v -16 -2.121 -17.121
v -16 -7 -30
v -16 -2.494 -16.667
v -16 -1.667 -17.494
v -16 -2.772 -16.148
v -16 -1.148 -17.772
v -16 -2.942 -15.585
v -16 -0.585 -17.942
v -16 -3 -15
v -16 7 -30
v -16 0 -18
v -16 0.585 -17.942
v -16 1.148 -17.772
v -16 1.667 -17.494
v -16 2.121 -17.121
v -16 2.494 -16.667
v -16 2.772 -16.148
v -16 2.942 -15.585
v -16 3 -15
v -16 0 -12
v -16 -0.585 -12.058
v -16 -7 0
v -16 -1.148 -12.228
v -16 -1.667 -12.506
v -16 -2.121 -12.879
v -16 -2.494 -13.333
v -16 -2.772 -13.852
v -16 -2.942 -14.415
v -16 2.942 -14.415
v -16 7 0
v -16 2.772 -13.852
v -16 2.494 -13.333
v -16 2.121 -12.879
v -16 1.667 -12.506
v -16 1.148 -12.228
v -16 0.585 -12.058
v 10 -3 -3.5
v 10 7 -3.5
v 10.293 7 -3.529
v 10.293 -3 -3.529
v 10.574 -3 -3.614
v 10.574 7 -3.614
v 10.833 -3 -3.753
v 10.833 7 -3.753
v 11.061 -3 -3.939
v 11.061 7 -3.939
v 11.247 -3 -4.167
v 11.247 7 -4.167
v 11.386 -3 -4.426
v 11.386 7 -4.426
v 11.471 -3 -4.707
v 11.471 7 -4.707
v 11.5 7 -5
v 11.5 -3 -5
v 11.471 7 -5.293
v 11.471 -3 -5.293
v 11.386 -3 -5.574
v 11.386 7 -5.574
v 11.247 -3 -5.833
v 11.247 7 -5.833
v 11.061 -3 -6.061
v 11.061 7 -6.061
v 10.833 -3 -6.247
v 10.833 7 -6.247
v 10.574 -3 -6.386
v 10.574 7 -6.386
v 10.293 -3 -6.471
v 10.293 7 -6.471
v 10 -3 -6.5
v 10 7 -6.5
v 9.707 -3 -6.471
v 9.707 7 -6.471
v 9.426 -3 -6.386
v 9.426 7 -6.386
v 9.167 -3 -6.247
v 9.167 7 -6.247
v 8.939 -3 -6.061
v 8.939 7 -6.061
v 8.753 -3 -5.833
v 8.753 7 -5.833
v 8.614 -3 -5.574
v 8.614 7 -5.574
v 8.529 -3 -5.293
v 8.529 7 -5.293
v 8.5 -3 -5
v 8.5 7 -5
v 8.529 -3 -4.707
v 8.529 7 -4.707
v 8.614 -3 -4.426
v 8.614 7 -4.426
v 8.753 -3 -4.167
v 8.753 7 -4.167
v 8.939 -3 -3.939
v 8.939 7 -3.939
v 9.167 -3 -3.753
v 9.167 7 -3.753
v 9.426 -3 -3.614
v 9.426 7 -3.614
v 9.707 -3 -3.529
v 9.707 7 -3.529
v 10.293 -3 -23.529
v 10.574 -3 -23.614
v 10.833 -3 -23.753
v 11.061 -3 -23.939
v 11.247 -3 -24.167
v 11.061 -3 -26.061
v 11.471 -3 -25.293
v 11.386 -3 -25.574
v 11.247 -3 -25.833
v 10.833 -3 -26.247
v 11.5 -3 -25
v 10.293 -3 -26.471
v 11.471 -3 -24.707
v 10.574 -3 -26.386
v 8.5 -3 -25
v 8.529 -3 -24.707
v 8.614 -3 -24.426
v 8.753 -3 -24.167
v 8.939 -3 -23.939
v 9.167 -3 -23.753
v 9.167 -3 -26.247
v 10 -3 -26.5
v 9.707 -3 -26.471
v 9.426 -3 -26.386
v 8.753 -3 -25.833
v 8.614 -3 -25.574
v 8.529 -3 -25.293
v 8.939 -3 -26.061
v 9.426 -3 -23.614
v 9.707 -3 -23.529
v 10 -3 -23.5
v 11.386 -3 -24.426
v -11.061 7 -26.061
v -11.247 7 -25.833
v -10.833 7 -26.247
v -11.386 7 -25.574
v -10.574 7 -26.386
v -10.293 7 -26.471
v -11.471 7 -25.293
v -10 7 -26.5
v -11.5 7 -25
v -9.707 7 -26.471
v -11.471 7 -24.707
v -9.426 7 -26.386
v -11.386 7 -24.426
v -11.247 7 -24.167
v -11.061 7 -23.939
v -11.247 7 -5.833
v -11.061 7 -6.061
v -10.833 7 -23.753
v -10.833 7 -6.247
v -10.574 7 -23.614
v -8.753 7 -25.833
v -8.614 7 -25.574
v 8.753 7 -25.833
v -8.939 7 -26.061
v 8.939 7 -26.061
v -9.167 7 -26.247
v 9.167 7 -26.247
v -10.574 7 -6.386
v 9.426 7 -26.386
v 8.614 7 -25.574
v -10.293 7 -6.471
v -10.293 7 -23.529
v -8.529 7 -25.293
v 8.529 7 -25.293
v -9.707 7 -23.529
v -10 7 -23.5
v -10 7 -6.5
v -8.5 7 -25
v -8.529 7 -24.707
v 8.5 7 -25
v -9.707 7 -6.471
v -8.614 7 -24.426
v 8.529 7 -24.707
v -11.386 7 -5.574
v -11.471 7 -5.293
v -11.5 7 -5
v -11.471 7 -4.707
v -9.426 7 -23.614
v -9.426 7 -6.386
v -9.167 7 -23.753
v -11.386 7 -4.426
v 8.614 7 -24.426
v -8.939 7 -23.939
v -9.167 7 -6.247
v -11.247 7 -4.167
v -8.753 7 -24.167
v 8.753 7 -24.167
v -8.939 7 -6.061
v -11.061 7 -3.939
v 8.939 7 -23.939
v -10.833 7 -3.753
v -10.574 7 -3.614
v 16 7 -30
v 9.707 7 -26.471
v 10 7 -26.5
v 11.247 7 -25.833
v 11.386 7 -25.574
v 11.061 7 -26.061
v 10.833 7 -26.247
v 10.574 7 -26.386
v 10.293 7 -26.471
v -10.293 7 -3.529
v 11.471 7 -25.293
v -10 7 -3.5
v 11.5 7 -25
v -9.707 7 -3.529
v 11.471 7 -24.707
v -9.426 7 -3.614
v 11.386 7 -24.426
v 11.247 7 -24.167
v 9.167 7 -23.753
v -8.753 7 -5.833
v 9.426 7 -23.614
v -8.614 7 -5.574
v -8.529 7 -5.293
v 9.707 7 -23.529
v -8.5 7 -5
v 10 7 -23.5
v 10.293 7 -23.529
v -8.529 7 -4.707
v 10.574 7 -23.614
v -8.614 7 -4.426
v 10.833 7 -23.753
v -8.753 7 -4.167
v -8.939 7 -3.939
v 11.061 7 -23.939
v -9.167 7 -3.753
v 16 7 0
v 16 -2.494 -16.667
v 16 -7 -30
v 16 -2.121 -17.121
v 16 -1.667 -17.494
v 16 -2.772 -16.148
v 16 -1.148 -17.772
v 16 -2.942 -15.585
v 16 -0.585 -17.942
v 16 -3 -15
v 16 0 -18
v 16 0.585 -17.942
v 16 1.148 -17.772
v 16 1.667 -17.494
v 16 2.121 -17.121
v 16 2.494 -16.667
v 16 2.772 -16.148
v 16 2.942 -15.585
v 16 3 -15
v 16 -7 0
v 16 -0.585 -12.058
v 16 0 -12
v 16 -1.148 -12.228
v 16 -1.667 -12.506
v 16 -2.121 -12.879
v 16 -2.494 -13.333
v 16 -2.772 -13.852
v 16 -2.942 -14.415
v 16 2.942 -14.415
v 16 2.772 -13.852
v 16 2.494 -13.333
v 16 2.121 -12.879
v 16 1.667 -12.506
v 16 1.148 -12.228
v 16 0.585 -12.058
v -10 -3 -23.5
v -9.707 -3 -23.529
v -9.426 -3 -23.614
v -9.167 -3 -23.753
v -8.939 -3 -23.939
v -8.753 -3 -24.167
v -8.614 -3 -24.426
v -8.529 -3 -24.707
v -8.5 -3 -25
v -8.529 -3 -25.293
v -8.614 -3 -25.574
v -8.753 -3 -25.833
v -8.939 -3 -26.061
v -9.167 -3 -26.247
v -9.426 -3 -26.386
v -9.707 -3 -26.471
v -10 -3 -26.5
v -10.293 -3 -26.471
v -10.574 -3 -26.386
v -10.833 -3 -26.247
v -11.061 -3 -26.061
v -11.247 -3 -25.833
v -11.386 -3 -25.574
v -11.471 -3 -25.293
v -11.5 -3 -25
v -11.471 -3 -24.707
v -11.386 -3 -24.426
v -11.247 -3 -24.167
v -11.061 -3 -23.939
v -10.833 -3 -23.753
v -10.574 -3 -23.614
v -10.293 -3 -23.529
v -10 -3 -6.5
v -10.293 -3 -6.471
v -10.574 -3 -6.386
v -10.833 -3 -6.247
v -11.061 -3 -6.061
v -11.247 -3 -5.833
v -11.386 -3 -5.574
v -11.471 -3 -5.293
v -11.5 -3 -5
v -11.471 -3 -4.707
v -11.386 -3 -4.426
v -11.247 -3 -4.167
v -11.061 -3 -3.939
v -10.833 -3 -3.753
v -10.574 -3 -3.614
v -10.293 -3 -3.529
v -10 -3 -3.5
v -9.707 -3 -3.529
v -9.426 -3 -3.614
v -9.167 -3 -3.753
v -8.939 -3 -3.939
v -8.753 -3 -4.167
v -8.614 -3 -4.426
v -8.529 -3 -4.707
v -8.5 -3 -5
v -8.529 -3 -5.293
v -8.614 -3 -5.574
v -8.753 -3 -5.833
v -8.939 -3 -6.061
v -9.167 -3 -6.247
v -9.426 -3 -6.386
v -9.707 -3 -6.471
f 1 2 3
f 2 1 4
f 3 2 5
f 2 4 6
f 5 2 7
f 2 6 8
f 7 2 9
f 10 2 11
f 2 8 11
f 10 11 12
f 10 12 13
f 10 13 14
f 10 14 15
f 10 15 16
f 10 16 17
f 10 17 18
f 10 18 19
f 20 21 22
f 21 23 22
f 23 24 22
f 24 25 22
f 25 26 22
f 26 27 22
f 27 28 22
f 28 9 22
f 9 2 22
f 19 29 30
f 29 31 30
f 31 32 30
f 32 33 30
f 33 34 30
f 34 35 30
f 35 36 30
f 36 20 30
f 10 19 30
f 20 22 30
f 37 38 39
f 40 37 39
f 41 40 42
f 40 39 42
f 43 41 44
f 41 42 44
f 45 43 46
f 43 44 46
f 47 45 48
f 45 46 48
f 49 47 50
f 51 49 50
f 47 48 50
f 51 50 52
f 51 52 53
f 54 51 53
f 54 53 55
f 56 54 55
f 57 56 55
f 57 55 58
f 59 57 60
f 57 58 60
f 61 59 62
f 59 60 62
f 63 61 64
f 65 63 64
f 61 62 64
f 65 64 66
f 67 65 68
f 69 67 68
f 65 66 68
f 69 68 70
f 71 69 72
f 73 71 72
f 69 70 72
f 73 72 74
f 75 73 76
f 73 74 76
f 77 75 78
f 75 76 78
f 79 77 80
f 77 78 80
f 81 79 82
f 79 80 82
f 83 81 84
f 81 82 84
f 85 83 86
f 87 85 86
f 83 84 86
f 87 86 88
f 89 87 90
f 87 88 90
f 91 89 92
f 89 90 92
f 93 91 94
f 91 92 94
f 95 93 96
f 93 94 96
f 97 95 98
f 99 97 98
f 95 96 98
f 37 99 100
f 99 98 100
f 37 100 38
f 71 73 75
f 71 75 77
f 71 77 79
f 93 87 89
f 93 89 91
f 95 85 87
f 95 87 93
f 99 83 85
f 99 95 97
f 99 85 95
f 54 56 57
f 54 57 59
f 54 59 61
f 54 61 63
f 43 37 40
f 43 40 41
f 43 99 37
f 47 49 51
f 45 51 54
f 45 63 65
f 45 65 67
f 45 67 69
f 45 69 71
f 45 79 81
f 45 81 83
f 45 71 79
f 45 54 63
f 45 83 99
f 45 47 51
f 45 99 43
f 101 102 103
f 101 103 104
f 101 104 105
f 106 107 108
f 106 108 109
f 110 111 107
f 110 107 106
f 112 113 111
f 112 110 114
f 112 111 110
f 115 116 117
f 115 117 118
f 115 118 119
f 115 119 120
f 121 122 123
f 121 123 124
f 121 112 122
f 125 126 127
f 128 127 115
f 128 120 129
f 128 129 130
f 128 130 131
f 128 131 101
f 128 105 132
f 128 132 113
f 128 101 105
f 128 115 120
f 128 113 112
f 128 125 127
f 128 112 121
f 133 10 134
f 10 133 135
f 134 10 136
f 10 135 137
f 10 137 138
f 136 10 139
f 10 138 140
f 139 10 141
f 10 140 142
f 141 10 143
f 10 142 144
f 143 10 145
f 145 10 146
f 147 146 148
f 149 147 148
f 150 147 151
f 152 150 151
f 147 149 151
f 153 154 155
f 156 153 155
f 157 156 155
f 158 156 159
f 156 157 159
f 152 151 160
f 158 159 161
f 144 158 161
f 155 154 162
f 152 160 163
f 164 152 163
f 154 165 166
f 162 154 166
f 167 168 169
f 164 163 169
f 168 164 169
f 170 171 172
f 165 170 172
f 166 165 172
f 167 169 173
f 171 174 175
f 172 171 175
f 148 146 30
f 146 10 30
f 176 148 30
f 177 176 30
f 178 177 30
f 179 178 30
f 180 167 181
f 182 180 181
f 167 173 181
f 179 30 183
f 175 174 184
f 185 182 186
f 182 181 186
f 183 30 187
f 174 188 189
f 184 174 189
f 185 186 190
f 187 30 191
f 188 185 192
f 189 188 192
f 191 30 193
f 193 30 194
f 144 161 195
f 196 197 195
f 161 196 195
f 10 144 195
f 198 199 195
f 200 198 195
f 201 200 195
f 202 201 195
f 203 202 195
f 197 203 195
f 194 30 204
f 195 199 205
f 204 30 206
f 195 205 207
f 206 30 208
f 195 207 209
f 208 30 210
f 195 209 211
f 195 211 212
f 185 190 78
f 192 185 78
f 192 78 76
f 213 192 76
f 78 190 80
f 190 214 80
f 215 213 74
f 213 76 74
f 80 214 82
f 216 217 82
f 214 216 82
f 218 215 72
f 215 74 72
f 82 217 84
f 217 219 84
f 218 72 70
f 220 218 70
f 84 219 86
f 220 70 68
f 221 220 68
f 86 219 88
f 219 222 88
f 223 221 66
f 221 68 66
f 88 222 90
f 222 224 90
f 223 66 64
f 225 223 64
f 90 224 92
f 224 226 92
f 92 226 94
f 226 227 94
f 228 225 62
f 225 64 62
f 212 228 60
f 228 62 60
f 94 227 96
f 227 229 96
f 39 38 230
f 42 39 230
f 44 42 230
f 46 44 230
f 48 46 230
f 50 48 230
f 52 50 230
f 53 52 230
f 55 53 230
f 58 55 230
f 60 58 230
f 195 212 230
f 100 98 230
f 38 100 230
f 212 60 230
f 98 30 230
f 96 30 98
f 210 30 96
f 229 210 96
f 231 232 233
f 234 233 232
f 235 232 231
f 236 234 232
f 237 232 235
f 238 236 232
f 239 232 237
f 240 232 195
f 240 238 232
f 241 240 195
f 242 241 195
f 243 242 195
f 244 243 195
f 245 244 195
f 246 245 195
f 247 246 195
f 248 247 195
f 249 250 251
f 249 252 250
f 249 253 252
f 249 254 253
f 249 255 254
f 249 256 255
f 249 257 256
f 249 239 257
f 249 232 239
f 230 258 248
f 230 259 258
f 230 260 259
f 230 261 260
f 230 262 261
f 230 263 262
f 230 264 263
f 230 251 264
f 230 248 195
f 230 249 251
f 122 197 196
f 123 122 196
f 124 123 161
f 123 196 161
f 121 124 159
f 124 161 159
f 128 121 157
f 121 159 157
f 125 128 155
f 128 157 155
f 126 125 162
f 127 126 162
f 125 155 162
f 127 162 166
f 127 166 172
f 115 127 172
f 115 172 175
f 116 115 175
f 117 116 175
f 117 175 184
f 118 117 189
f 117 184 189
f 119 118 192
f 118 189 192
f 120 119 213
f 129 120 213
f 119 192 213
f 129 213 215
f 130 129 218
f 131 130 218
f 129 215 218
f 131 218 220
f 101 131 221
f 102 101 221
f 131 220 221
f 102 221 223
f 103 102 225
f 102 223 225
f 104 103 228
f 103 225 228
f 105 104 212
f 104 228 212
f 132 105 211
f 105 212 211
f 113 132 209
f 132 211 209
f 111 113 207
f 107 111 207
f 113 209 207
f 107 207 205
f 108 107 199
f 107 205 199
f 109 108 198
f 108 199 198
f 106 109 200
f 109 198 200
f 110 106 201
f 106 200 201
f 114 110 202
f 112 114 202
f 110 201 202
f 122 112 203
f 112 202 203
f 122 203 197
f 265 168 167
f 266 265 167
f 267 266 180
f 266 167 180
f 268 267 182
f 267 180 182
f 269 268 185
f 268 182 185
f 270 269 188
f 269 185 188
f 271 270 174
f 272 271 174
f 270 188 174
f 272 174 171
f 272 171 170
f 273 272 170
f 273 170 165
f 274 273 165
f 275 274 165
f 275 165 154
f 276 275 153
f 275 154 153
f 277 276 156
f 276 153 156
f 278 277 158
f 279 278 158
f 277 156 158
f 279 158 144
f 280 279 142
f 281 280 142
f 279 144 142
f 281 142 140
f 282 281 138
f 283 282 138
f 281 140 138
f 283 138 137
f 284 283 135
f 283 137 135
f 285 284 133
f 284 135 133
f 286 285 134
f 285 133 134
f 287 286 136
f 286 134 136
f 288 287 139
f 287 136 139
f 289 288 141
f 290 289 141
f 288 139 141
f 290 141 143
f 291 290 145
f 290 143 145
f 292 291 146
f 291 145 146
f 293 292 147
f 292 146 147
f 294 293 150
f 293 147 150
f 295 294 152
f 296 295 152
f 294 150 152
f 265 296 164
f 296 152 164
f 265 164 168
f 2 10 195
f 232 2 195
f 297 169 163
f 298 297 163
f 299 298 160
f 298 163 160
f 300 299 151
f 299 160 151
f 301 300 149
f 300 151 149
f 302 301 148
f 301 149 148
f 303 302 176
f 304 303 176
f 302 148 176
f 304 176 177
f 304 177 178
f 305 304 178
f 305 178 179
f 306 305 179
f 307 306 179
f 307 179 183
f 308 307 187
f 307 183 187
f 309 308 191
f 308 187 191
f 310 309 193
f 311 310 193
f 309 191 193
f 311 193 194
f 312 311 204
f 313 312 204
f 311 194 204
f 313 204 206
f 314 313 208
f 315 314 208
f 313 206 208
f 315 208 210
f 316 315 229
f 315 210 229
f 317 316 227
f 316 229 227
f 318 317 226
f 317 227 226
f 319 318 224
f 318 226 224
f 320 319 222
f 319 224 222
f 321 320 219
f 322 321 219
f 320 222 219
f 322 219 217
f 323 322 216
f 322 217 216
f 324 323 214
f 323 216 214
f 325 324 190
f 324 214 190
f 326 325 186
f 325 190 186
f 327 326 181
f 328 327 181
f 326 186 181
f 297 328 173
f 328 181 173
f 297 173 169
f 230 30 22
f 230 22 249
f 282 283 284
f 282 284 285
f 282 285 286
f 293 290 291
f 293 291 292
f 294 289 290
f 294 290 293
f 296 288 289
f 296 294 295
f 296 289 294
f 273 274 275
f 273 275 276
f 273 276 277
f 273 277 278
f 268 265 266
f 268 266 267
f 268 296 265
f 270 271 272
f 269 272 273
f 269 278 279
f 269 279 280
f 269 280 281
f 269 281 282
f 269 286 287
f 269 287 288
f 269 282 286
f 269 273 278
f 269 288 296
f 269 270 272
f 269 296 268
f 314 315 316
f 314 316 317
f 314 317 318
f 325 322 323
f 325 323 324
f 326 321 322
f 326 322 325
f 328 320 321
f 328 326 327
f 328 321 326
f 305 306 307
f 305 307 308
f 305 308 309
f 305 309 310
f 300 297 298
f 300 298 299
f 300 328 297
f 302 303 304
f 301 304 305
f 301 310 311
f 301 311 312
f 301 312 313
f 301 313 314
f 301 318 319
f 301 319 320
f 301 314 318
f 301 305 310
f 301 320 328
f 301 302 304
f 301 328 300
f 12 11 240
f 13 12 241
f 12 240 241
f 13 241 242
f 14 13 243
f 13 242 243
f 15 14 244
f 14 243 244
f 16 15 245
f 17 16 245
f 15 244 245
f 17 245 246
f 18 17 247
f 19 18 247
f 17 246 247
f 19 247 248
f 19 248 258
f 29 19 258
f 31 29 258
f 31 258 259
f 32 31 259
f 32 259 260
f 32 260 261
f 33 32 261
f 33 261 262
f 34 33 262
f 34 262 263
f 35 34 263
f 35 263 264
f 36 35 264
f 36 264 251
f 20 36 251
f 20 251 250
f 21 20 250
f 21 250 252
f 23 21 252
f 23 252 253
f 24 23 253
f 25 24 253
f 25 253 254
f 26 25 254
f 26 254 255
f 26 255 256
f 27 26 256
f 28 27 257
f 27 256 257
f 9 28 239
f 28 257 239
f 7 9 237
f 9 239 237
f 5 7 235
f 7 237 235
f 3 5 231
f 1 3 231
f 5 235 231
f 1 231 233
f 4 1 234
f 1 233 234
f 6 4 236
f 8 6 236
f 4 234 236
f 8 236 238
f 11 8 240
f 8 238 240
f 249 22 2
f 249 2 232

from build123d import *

# Parameters (mm, degrees)
SKETCH_1_W          = 32
SKETCH_1_H          = 14
EXTRUDE_1_DEPTH     = 30
SKETCH_2_R          = 1.5
CUT_EXTRUDE_1_DEPTH = 10
CUT_EXTRUDE_2_REACH = 46.418
SKETCH_3_R          = 3


with BuildPart() as part:
    # 草图1 → 凸台-拉伸1 (new body)
    with BuildSketch(Plane.XY):
        Rectangle(SKETCH_1_W, SKETCH_1_H)
    extrude(amount=-EXTRUDE_1_DEPTH)

    # 草图2 → 切除-拉伸1 (cut)
    with BuildSketch(Plane(origin=(0, 7, 0), x_dir=(1, 0, 0), z_dir=(0, 1, 0))):
        with Locations(Location((-10, 25, 0), (0, 0, 270))):
            Circle(SKETCH_2_R)
        with Locations(Location((10, 25, 0), (0, 0, 90))):
            Circle(SKETCH_2_R)
        with Locations(Location((10, 5, 0), (0, 0, 270))):
            Circle(SKETCH_2_R)
        with Locations(Location((-10, 5, 0), (0, 0, 90))):
            Circle(SKETCH_2_R)
    extrude(amount=-CUT_EXTRUDE_1_DEPTH, mode=Mode.SUBTRACT)

    # 草图3 → 切除-拉伸2 (cut, up to next)
    with BuildSketch(Plane(origin=(16, 0, 0), x_dir=(0, 0, -1), z_dir=(1, 0, 0)), mode=Mode.PRIVATE) as cut_extrude_2_sk1:
        with Locations((15, 0)):
            Circle(SKETCH_3_R)
    cut_extrude_2_tool1 = extrude(cut_extrude_2_sk1.sketch, amount=-CUT_EXTRUDE_2_REACH, mode=Mode.PRIVATE) & part.part
    add(cut_extrude_2_tool1.solids().sort_by_distance((16, 0, -15))[0], mode=Mode.SUBTRACT)


solid = part.part
